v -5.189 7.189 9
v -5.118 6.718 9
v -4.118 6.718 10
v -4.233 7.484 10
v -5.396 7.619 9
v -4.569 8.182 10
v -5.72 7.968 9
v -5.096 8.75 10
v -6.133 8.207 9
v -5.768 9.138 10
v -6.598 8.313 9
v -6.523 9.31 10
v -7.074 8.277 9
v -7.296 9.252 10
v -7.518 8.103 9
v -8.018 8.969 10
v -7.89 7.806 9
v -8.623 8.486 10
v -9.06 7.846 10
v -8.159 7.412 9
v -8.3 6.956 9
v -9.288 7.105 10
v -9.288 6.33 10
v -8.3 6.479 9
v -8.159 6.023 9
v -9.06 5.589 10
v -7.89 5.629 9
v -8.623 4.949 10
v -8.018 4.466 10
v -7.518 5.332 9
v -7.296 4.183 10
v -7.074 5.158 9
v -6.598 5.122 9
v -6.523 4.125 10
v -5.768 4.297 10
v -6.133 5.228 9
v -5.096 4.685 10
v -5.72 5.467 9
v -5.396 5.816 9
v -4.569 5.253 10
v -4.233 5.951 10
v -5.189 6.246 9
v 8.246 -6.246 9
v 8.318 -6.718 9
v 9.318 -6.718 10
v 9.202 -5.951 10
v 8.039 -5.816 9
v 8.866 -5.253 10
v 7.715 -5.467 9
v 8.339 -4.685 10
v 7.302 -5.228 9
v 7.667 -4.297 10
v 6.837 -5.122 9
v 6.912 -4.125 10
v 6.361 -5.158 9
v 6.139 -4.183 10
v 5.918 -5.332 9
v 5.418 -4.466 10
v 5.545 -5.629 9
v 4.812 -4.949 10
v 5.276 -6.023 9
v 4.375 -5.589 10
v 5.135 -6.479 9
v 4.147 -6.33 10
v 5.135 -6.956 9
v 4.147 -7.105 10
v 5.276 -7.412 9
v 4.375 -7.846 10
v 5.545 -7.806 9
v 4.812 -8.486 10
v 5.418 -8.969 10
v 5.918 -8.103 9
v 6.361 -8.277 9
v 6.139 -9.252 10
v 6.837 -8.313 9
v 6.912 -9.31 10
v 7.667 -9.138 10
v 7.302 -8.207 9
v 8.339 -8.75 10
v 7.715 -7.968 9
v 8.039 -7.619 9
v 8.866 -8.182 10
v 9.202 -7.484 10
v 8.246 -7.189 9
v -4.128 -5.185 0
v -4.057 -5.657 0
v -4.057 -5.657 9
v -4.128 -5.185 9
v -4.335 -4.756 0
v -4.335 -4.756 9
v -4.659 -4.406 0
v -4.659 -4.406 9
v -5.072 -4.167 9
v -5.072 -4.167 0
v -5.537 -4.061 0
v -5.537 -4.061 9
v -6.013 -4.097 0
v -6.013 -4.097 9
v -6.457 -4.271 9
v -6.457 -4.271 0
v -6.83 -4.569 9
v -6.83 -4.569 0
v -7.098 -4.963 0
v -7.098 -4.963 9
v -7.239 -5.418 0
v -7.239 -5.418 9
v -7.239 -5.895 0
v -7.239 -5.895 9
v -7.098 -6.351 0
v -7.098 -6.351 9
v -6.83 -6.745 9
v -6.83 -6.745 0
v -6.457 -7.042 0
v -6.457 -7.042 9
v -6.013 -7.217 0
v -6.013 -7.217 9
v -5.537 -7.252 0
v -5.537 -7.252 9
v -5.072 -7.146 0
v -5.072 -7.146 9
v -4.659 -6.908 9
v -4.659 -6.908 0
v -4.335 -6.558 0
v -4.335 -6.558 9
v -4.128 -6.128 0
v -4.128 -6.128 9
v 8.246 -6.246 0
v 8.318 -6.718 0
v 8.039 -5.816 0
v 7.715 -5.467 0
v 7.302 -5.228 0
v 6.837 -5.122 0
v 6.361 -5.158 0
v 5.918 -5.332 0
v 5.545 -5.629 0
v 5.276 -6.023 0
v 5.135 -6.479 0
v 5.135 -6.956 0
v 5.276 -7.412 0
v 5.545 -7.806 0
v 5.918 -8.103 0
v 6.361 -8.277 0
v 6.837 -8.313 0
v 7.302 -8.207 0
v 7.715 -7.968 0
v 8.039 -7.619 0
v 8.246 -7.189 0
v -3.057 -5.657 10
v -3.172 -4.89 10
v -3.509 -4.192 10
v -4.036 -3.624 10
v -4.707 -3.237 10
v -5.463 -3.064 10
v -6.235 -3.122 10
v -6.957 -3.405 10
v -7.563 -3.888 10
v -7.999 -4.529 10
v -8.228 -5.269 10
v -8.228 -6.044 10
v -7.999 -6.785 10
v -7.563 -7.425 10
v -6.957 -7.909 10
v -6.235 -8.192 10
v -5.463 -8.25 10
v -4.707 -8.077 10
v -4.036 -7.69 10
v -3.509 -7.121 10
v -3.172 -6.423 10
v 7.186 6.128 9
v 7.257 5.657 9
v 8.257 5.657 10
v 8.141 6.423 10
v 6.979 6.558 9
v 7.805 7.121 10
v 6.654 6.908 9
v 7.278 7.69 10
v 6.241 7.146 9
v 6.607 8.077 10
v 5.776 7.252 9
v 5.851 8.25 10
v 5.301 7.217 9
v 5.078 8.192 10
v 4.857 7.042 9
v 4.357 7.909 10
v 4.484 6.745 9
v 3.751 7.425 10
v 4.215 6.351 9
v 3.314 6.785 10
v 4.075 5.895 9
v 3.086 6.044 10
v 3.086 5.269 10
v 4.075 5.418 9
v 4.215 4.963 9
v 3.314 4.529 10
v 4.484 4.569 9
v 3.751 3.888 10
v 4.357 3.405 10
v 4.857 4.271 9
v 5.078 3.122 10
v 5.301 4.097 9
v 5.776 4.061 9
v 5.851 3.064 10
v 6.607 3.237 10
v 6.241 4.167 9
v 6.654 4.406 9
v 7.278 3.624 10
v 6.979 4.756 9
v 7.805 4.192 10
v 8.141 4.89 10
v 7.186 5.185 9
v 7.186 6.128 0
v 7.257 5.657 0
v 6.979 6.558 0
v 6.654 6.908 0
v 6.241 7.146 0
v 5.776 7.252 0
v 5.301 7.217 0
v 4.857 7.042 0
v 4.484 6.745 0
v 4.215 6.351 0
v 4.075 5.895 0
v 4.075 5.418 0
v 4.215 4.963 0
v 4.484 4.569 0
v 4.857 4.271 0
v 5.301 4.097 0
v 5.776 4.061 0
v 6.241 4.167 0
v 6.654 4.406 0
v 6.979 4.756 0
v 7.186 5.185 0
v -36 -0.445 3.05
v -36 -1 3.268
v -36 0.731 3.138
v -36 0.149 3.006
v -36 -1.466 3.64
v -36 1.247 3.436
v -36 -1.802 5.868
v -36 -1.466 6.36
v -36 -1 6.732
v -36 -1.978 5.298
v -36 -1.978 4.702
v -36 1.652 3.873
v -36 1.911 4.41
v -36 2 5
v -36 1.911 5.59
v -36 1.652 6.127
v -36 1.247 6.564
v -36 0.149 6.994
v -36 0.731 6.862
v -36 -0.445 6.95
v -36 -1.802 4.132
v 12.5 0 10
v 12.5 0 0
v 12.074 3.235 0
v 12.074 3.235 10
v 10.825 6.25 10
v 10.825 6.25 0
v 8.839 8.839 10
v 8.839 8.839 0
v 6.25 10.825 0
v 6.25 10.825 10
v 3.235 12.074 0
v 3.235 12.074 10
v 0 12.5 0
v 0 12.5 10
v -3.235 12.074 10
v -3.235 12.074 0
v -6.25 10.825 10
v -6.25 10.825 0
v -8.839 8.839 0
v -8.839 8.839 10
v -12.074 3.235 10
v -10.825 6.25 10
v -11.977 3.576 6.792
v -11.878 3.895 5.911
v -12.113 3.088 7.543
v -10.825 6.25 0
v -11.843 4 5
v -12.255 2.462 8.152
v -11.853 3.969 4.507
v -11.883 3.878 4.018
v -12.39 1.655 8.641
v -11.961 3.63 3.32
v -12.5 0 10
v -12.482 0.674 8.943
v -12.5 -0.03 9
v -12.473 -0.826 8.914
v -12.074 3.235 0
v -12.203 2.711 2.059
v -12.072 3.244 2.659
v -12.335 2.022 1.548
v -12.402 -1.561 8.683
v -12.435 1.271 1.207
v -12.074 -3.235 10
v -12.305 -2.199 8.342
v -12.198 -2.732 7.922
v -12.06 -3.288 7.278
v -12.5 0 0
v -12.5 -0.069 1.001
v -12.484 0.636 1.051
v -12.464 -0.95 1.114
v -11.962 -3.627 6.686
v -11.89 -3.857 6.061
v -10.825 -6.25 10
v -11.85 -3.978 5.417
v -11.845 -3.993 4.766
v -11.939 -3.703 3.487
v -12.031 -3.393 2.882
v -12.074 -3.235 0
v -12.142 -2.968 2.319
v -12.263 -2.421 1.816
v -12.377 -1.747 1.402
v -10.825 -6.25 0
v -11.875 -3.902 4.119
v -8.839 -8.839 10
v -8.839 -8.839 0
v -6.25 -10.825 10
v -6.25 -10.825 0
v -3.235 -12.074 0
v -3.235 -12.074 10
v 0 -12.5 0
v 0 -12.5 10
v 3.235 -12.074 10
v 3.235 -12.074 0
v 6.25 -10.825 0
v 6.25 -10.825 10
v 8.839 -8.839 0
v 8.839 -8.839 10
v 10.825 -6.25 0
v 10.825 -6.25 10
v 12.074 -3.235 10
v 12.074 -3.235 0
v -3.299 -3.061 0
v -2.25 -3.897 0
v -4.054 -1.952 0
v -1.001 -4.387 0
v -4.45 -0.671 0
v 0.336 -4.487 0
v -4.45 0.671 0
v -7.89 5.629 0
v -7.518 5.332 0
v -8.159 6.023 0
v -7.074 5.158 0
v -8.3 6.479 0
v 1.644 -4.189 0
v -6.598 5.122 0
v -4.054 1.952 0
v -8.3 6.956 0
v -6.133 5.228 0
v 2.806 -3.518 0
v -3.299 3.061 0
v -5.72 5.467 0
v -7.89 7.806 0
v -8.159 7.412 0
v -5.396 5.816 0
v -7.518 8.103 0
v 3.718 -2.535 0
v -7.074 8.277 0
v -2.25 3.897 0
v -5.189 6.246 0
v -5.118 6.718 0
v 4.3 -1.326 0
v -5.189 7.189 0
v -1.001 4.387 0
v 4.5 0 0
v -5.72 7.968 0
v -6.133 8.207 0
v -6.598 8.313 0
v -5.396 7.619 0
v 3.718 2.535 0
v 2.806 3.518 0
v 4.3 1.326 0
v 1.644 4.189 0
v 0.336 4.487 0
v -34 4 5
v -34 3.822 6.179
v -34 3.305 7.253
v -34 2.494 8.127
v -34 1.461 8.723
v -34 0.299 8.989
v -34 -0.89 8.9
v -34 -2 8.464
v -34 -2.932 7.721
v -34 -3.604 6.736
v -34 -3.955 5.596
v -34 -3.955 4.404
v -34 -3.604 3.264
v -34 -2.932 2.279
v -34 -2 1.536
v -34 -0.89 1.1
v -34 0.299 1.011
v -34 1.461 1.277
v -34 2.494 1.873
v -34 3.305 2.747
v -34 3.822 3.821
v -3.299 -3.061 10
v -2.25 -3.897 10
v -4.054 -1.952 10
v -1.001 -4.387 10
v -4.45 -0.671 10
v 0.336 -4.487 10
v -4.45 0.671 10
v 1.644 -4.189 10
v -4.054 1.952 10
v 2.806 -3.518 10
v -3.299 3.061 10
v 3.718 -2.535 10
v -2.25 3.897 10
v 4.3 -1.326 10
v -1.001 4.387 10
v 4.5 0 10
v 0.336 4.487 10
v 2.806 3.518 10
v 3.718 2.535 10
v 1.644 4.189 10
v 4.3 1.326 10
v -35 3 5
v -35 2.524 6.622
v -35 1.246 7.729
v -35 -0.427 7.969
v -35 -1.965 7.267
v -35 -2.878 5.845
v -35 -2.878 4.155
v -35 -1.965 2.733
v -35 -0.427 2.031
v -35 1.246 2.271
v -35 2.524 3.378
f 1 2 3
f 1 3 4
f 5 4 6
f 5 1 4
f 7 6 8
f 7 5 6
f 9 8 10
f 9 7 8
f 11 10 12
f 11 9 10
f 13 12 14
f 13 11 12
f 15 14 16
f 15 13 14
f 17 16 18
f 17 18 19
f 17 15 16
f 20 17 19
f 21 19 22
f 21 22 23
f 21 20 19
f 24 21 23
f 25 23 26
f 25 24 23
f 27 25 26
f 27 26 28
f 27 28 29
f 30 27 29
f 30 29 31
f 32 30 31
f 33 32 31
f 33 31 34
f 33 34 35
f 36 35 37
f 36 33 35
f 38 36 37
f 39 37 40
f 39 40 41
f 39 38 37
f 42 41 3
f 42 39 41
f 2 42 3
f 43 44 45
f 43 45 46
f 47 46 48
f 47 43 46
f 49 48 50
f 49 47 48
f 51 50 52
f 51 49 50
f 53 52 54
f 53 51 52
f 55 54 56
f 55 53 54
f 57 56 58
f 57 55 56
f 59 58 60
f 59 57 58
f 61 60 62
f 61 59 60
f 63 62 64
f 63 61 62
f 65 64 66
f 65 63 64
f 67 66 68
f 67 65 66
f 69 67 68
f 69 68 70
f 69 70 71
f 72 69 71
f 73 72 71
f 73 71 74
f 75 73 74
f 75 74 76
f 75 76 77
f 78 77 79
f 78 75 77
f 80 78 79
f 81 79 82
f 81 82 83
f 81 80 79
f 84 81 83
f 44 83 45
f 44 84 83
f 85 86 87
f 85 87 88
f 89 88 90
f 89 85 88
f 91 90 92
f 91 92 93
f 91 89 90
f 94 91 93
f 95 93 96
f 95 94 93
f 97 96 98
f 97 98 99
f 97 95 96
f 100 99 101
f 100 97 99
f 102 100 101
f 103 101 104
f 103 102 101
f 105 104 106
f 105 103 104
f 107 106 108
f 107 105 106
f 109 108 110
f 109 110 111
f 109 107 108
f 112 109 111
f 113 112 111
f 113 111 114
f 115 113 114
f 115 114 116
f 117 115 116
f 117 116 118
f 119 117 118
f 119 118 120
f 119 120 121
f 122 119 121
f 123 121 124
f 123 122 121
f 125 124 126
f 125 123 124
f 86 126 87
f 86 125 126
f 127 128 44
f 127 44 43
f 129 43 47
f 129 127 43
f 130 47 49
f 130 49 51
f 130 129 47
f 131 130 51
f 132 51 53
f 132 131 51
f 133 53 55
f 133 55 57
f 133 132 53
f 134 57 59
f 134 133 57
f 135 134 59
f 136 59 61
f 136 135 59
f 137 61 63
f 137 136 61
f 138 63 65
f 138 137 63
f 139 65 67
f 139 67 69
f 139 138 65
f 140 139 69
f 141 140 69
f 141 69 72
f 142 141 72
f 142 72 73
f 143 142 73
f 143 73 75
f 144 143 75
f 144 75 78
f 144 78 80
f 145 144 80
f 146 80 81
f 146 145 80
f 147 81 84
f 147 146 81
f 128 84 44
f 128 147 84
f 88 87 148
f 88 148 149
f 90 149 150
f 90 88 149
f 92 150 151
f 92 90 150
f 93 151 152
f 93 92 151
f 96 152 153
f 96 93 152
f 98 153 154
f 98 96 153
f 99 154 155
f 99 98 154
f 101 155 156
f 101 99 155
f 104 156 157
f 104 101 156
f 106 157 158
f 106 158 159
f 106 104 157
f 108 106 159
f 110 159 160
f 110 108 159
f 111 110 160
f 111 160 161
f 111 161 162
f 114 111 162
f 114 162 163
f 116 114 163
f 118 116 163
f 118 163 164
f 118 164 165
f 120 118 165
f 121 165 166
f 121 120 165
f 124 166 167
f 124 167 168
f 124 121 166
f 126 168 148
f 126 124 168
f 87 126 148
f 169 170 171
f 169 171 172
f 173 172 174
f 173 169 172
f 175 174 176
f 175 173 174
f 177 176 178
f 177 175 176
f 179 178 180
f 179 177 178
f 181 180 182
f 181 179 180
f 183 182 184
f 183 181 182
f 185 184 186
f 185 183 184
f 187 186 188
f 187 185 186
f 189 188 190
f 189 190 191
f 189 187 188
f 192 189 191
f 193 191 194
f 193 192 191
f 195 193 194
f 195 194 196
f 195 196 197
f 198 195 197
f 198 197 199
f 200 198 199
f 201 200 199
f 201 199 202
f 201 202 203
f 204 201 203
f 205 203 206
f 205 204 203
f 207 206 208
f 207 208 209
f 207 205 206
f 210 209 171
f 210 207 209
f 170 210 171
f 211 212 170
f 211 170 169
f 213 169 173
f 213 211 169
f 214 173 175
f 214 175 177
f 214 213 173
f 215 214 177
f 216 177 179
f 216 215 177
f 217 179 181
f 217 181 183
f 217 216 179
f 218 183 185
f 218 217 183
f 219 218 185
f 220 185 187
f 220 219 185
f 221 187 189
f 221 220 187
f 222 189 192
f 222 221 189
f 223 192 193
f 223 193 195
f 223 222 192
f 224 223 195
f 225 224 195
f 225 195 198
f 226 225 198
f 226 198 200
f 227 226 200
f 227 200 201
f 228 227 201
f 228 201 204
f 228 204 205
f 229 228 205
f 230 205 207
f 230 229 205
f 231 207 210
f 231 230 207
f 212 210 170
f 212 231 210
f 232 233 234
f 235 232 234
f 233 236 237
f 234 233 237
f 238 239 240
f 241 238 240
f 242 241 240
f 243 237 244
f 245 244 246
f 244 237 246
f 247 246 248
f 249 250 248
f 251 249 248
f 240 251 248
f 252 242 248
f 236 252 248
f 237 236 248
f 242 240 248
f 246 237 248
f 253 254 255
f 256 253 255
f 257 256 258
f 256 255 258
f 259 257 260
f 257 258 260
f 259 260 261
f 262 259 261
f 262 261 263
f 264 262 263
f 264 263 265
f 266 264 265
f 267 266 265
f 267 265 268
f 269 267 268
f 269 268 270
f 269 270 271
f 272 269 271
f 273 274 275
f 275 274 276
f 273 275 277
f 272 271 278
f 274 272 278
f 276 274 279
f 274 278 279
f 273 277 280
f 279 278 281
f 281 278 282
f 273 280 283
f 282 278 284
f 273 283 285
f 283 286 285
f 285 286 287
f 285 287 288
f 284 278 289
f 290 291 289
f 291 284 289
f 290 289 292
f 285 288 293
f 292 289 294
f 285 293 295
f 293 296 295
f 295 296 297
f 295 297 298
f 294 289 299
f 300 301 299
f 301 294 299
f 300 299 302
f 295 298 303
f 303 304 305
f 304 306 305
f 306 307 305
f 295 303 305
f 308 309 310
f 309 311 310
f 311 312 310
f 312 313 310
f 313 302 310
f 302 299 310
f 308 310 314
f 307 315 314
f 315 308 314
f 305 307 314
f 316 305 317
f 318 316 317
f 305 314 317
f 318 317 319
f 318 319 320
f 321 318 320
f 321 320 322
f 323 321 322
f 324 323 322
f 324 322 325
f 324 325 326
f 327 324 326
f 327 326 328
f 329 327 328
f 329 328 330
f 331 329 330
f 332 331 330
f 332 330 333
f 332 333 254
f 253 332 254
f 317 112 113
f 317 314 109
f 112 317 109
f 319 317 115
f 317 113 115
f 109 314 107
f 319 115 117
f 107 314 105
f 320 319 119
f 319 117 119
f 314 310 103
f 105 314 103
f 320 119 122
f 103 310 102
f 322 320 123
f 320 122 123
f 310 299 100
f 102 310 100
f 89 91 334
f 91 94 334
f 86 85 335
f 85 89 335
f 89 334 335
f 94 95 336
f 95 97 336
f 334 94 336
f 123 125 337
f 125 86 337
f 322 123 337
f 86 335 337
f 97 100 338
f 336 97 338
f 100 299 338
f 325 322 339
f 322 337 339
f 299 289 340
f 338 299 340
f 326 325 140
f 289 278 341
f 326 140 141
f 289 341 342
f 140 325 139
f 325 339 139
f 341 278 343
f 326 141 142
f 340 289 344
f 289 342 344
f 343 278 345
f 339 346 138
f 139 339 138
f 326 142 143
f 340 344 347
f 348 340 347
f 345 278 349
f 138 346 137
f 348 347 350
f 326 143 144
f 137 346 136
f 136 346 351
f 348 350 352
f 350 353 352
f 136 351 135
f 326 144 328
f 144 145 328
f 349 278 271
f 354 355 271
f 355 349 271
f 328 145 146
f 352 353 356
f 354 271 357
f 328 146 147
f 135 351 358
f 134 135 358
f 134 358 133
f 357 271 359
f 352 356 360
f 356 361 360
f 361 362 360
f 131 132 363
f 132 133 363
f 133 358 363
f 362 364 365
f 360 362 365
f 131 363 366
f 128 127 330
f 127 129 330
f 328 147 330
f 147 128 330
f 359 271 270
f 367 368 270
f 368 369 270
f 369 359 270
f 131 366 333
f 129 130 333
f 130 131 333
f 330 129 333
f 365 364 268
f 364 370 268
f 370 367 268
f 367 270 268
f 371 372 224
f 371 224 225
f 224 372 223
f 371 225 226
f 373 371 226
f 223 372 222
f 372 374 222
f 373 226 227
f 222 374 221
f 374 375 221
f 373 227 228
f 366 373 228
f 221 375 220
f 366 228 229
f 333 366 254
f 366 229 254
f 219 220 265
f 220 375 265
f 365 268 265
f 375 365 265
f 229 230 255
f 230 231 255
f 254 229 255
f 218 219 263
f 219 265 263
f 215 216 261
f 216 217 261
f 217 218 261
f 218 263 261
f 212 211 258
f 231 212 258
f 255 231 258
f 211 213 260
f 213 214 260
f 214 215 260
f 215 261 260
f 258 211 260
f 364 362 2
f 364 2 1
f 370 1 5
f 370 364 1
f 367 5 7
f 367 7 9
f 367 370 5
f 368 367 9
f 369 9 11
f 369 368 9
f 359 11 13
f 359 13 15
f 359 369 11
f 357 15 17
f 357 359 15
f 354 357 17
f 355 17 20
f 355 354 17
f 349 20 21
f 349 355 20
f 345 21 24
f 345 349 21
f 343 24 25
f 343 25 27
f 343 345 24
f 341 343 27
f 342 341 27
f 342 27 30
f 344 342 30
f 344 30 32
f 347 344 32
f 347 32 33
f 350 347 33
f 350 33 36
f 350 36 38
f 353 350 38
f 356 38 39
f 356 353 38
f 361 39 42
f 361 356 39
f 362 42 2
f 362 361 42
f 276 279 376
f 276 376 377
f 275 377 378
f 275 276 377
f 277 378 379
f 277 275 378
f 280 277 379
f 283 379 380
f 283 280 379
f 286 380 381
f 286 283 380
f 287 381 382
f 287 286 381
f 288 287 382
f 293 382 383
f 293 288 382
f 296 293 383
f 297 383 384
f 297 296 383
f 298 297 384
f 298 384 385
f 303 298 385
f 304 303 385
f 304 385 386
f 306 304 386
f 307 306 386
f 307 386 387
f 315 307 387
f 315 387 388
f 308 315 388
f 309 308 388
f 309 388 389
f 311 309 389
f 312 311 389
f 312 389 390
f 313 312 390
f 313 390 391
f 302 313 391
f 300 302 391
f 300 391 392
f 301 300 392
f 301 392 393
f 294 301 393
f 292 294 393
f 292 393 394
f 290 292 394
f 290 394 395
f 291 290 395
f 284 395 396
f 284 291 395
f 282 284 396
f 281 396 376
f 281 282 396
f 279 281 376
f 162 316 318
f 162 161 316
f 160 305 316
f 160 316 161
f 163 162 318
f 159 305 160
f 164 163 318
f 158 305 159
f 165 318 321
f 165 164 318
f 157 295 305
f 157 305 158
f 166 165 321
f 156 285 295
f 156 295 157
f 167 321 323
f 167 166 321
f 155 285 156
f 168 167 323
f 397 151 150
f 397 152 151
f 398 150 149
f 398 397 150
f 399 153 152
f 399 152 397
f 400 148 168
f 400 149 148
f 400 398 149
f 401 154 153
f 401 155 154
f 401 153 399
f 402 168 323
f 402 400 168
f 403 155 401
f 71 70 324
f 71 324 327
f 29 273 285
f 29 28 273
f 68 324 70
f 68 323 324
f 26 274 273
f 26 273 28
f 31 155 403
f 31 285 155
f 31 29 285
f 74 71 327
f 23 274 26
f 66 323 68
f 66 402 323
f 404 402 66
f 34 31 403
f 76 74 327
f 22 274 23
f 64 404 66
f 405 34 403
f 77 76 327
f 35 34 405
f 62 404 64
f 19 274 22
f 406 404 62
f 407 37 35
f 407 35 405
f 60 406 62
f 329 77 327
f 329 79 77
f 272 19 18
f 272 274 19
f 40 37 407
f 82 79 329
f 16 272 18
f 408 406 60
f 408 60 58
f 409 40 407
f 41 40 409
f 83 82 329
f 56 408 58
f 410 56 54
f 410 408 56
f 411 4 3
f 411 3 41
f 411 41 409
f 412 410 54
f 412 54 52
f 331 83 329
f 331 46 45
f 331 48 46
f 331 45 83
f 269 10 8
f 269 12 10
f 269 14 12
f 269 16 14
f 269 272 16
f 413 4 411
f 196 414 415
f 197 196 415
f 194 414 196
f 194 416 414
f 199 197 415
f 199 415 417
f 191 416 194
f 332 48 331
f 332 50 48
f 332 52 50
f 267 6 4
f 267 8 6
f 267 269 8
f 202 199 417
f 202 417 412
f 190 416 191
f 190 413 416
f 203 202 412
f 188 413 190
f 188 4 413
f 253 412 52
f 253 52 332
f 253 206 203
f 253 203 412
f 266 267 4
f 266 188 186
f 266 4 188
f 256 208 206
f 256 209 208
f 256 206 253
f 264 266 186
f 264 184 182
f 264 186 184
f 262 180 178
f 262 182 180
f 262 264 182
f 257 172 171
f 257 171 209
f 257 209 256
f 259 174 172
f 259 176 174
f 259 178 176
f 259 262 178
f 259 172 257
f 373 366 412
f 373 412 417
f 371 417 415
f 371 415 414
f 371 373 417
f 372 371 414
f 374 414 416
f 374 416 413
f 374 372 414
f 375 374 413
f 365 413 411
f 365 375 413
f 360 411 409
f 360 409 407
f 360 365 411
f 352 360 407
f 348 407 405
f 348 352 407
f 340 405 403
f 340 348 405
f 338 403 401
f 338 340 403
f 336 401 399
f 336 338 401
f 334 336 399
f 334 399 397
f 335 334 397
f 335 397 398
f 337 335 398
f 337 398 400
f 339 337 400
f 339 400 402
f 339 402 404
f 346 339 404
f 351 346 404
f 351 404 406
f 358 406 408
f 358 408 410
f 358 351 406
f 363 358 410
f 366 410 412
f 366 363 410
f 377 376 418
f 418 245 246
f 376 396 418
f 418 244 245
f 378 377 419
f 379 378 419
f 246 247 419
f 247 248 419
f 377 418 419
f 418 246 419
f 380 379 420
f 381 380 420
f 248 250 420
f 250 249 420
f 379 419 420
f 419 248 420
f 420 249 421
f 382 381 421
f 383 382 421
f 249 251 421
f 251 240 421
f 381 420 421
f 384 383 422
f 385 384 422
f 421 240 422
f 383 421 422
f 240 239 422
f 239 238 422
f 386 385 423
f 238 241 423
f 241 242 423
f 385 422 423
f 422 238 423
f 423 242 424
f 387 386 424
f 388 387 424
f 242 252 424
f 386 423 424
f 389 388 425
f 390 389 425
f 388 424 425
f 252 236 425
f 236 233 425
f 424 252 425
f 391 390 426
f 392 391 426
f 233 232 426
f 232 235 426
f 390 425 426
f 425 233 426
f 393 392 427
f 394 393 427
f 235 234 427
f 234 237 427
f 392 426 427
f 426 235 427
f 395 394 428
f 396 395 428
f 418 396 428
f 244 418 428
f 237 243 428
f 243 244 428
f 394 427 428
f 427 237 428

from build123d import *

# Parameters (mm, degrees)
SKETCH_R        = 12.5
SKETCH_R_2      = 4.5
SKETCH_R_3      = 1.6
PAD_DEPTH       = 10
SKETCH001_R     = 4
PAD001_DEPTH    = 28
CHAMFER_SIZE    = 2
CHAMFER001_SIZE = 1


with BuildPart() as part:
    # Sketch → Pad (new body)
    with BuildSketch(Plane.XY):
        Circle(SKETCH_R)
        Circle(SKETCH_R_2, mode=Mode.SUBTRACT)
        with Locations((-6.717514, 6.717514)):
            Circle(SKETCH_R_3, mode=Mode.SUBTRACT)
        with Locations((5.656854, 5.656854)):
            Circle(SKETCH_R_3, mode=Mode.SUBTRACT)
        with Locations((6.717514, -6.717514)):
            Circle(SKETCH_R_3, mode=Mode.SUBTRACT)
        with Locations((-5.656854, -5.656854)):
            Circle(SKETCH_R_3, mode=Mode.SUBTRACT)
    extrude(amount=PAD_DEPTH)

    # Sketch001 → Pad001 (join)
    with BuildSketch(Plane.YZ.offset(-8)):
        with Locations((0, 5)):
            Circle(SKETCH001_R)
    extrude(amount=-PAD001_DEPTH)

    # Chamfer
    chamfer_edges = [part.edges().sort_by_distance(p)[0] for p in [
        (-36, -4, 5),
    ]]
    chamfer(chamfer_edges, length=CHAMFER_SIZE)

    # Chamfer001
    chamfer001_edges = [part.edges().sort_by_distance(p)[0] for p in [
        (4.056854, 5.656854, 10),
        (5.117514, -6.717514, 10),
        (-7.256854, -5.656854, 10),
        (-8.317514, 6.717514, 10),
    ]]
    chamfer(chamfer001_edges, length=CHAMFER001_SIZE)


solid = part.part
